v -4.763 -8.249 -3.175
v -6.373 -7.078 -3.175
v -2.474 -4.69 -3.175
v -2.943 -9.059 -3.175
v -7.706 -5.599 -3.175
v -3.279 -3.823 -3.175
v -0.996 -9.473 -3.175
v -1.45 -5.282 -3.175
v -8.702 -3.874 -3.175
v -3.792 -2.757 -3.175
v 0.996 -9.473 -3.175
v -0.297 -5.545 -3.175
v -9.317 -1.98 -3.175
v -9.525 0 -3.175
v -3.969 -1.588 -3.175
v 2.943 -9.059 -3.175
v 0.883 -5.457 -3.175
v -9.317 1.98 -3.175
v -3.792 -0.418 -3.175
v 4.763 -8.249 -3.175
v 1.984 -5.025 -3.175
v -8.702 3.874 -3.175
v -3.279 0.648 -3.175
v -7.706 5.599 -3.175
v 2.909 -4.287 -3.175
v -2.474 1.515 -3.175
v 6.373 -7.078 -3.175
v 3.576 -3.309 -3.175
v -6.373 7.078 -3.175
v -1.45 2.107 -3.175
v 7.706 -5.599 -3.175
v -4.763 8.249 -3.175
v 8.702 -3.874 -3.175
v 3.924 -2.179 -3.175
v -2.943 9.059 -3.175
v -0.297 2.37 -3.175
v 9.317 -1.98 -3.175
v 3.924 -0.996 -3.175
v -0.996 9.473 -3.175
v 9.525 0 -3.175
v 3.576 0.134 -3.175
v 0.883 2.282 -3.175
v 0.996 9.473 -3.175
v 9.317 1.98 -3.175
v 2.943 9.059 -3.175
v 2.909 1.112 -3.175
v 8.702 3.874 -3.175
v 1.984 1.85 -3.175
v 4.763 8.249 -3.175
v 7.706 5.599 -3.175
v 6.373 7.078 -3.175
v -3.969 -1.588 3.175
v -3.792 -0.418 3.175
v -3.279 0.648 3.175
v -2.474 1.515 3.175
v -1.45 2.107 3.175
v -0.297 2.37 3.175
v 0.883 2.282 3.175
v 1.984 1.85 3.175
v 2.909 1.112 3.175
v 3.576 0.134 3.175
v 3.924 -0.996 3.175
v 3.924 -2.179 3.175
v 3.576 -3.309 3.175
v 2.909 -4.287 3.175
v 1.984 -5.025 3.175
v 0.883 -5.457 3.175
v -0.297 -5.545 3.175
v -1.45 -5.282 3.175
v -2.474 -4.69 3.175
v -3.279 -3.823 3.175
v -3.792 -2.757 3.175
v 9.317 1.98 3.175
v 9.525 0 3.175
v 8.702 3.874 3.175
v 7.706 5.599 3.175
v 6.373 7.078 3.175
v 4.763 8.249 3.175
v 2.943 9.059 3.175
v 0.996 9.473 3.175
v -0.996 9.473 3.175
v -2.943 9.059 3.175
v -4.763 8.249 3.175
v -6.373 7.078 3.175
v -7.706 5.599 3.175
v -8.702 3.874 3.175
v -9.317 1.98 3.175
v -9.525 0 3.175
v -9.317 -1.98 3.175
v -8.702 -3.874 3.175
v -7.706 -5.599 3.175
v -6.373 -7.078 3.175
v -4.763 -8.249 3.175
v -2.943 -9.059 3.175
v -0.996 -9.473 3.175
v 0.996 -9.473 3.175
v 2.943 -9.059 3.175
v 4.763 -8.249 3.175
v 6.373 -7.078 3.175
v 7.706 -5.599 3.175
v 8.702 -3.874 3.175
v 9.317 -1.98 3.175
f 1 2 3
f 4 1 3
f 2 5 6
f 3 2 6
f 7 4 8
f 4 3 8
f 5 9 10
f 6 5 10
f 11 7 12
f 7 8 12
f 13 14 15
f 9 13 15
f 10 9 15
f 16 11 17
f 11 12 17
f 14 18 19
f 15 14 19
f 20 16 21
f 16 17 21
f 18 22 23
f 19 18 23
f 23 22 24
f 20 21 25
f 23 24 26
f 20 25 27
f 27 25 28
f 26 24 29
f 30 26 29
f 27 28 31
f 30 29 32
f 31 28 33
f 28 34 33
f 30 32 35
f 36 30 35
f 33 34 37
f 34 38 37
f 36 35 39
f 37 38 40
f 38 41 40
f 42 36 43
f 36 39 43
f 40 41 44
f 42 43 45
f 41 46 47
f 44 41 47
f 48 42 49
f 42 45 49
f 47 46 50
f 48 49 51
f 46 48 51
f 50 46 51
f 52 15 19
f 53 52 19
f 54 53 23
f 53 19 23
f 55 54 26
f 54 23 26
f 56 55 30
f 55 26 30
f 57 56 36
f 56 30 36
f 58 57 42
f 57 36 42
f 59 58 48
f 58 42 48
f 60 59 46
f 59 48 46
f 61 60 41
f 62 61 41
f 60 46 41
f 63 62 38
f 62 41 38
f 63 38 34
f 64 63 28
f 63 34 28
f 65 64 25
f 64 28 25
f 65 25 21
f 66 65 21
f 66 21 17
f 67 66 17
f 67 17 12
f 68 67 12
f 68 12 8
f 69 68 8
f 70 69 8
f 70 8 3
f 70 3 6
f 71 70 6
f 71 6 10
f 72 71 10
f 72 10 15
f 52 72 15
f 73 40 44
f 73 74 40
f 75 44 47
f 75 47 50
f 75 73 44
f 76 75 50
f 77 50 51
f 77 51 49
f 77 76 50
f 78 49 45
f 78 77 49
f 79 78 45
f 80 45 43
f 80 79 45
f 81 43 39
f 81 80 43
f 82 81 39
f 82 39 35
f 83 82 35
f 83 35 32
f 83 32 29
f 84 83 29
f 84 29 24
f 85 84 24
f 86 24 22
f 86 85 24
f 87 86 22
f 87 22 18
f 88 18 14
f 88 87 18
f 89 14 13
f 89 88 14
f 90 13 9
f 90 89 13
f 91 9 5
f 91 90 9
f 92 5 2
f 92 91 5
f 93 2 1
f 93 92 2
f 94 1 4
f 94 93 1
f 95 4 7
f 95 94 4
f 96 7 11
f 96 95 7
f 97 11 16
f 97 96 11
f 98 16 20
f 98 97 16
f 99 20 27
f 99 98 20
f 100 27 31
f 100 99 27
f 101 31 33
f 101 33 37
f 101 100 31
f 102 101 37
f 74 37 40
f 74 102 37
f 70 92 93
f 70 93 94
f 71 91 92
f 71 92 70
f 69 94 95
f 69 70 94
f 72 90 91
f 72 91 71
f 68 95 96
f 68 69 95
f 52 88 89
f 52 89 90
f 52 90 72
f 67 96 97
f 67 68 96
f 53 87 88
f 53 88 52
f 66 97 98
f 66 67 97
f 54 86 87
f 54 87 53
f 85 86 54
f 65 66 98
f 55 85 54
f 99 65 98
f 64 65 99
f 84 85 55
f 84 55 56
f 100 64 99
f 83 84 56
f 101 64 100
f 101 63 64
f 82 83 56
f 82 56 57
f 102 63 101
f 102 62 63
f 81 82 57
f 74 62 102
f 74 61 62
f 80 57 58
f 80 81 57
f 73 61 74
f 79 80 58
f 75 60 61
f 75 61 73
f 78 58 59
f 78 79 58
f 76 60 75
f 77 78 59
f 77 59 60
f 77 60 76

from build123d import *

# Parameters (mm, degrees)
SKETCH1_R                      = 9.525
EXTRUDE1_DEPTH                 = 3.175
F_5_16_0_3125_DIAMETER_HOLE1_D = 7.9375


with BuildPart() as part:
    # Sketch1 → Extrude1 (new, symmetric)
    with BuildSketch(Plane.XY):
        Circle(SKETCH1_R)
    extrude(amount=EXTRUDE1_DEPTH, both=True)

    # 5/16 (0.3125) Diameter Hole1 (through all)
    with Locations(Plane.XY.offset(3.175)):
        with Locations((0, -1.5875)):
            Hole(F_5_16_0_3125_DIAMETER_HOLE1_D / 2)


solid = part.part
